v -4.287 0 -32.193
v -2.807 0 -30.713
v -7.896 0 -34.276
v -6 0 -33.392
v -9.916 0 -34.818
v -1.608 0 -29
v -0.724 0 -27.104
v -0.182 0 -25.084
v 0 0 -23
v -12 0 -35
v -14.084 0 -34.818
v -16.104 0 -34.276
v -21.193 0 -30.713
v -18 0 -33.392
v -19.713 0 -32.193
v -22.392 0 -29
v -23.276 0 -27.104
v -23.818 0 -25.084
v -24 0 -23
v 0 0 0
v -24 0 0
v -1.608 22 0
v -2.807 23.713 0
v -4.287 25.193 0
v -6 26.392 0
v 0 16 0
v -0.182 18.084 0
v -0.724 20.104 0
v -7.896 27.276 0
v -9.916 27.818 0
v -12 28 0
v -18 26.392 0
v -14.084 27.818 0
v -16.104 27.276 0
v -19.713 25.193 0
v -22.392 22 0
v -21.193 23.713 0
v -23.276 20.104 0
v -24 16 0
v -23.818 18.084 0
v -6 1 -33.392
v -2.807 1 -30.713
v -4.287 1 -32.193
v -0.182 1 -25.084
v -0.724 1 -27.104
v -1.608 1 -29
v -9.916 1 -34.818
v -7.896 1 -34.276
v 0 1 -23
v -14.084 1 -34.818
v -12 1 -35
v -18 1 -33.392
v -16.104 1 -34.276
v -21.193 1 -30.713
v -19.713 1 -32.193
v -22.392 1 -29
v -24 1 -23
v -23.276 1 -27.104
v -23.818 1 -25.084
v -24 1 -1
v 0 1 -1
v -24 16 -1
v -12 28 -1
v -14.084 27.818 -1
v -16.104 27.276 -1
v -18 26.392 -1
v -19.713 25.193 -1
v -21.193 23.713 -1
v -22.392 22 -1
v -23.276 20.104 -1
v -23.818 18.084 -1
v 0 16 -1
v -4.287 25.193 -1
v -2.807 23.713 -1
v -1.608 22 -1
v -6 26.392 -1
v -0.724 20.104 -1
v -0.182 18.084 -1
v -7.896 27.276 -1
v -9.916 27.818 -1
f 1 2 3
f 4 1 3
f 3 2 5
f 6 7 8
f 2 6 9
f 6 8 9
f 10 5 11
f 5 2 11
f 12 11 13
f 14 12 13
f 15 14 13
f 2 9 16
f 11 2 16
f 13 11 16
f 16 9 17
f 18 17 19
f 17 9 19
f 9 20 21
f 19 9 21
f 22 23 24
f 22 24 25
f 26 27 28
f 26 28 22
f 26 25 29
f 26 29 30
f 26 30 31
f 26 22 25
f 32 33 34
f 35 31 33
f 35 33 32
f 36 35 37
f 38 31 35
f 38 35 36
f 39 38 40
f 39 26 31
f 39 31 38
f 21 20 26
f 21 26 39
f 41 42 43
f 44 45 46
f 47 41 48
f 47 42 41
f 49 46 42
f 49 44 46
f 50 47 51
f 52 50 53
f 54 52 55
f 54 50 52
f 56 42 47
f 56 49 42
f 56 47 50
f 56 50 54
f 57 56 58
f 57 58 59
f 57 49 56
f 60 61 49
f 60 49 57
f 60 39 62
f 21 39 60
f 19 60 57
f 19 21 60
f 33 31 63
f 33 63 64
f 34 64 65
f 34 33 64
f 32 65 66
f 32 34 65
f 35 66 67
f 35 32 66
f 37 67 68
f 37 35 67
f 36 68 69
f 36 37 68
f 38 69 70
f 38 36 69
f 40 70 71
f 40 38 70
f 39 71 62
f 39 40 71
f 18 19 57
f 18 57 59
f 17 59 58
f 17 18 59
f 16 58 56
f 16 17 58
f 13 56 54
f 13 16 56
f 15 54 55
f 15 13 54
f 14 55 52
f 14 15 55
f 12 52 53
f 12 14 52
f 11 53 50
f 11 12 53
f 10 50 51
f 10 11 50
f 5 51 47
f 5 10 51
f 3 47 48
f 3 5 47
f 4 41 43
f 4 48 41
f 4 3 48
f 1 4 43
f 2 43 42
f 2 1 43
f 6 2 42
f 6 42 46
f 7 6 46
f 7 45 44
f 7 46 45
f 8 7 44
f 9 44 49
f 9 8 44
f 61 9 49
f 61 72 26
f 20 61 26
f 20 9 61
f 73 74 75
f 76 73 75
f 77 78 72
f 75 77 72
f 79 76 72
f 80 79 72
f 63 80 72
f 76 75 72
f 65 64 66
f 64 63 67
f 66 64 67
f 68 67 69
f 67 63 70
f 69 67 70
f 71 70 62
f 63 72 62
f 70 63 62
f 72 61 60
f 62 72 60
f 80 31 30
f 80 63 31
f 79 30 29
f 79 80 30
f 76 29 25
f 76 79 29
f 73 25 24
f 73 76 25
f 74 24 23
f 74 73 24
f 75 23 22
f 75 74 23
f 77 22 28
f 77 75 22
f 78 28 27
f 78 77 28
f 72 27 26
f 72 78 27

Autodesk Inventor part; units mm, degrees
ref_plane "YZ Plane" through (0, 0, 0) normal (1, 0, 0) x (0, 1, 0)
ref_plane "XZ Plane" through (0, 0, 0) normal (0, 1, 0) x (-1, 0, 0)
ref_plane "XY Plane" through (0, 0, 0) normal (0, 0, 1) x (1, 0, 0)
sketch "Sketch1" plane through (0, 0, 0) normal (0, 1, 0) x (-1, 0, 0)
  line L0 (0, 0) -> (24, 0)
  line L1 (24, 0) -> (24, -35)
  line L2 (0, -35) -> (0, 0)
  arc A0 (0, -23) -> (24, -23) centre (12, -23) ccw
  dimension "d0" = 24
  dimension "d1" = 35
extrude "Extrusion1" add sketch "Sketch1" along normal blind 1
sketch "Sketch2" plane through (0, 1, 0) normal (0, 1, 0) x (1, 0, 0)
  line L0 (-24, 0) -> (0, 0) projected
  line L1 (0, 0) -> (0, 23) projected
  line L2 (-24, 0) -> (0, 0)
  line L3 (0, 0) -> (0, 1)
  line L4 (0, 1) -> (-24, 1)
  line L5 (-24, 1) -> (-24, 0)
  dimension "d4" = 1
extrude "Extrusion2" add sketch "Sketch2" along normal blind 27
fillet "Fillet1" radius 12 2 edges at (0, 28, -0.5) (-24, 28, -0.5)
properties part number "linkage connector"
